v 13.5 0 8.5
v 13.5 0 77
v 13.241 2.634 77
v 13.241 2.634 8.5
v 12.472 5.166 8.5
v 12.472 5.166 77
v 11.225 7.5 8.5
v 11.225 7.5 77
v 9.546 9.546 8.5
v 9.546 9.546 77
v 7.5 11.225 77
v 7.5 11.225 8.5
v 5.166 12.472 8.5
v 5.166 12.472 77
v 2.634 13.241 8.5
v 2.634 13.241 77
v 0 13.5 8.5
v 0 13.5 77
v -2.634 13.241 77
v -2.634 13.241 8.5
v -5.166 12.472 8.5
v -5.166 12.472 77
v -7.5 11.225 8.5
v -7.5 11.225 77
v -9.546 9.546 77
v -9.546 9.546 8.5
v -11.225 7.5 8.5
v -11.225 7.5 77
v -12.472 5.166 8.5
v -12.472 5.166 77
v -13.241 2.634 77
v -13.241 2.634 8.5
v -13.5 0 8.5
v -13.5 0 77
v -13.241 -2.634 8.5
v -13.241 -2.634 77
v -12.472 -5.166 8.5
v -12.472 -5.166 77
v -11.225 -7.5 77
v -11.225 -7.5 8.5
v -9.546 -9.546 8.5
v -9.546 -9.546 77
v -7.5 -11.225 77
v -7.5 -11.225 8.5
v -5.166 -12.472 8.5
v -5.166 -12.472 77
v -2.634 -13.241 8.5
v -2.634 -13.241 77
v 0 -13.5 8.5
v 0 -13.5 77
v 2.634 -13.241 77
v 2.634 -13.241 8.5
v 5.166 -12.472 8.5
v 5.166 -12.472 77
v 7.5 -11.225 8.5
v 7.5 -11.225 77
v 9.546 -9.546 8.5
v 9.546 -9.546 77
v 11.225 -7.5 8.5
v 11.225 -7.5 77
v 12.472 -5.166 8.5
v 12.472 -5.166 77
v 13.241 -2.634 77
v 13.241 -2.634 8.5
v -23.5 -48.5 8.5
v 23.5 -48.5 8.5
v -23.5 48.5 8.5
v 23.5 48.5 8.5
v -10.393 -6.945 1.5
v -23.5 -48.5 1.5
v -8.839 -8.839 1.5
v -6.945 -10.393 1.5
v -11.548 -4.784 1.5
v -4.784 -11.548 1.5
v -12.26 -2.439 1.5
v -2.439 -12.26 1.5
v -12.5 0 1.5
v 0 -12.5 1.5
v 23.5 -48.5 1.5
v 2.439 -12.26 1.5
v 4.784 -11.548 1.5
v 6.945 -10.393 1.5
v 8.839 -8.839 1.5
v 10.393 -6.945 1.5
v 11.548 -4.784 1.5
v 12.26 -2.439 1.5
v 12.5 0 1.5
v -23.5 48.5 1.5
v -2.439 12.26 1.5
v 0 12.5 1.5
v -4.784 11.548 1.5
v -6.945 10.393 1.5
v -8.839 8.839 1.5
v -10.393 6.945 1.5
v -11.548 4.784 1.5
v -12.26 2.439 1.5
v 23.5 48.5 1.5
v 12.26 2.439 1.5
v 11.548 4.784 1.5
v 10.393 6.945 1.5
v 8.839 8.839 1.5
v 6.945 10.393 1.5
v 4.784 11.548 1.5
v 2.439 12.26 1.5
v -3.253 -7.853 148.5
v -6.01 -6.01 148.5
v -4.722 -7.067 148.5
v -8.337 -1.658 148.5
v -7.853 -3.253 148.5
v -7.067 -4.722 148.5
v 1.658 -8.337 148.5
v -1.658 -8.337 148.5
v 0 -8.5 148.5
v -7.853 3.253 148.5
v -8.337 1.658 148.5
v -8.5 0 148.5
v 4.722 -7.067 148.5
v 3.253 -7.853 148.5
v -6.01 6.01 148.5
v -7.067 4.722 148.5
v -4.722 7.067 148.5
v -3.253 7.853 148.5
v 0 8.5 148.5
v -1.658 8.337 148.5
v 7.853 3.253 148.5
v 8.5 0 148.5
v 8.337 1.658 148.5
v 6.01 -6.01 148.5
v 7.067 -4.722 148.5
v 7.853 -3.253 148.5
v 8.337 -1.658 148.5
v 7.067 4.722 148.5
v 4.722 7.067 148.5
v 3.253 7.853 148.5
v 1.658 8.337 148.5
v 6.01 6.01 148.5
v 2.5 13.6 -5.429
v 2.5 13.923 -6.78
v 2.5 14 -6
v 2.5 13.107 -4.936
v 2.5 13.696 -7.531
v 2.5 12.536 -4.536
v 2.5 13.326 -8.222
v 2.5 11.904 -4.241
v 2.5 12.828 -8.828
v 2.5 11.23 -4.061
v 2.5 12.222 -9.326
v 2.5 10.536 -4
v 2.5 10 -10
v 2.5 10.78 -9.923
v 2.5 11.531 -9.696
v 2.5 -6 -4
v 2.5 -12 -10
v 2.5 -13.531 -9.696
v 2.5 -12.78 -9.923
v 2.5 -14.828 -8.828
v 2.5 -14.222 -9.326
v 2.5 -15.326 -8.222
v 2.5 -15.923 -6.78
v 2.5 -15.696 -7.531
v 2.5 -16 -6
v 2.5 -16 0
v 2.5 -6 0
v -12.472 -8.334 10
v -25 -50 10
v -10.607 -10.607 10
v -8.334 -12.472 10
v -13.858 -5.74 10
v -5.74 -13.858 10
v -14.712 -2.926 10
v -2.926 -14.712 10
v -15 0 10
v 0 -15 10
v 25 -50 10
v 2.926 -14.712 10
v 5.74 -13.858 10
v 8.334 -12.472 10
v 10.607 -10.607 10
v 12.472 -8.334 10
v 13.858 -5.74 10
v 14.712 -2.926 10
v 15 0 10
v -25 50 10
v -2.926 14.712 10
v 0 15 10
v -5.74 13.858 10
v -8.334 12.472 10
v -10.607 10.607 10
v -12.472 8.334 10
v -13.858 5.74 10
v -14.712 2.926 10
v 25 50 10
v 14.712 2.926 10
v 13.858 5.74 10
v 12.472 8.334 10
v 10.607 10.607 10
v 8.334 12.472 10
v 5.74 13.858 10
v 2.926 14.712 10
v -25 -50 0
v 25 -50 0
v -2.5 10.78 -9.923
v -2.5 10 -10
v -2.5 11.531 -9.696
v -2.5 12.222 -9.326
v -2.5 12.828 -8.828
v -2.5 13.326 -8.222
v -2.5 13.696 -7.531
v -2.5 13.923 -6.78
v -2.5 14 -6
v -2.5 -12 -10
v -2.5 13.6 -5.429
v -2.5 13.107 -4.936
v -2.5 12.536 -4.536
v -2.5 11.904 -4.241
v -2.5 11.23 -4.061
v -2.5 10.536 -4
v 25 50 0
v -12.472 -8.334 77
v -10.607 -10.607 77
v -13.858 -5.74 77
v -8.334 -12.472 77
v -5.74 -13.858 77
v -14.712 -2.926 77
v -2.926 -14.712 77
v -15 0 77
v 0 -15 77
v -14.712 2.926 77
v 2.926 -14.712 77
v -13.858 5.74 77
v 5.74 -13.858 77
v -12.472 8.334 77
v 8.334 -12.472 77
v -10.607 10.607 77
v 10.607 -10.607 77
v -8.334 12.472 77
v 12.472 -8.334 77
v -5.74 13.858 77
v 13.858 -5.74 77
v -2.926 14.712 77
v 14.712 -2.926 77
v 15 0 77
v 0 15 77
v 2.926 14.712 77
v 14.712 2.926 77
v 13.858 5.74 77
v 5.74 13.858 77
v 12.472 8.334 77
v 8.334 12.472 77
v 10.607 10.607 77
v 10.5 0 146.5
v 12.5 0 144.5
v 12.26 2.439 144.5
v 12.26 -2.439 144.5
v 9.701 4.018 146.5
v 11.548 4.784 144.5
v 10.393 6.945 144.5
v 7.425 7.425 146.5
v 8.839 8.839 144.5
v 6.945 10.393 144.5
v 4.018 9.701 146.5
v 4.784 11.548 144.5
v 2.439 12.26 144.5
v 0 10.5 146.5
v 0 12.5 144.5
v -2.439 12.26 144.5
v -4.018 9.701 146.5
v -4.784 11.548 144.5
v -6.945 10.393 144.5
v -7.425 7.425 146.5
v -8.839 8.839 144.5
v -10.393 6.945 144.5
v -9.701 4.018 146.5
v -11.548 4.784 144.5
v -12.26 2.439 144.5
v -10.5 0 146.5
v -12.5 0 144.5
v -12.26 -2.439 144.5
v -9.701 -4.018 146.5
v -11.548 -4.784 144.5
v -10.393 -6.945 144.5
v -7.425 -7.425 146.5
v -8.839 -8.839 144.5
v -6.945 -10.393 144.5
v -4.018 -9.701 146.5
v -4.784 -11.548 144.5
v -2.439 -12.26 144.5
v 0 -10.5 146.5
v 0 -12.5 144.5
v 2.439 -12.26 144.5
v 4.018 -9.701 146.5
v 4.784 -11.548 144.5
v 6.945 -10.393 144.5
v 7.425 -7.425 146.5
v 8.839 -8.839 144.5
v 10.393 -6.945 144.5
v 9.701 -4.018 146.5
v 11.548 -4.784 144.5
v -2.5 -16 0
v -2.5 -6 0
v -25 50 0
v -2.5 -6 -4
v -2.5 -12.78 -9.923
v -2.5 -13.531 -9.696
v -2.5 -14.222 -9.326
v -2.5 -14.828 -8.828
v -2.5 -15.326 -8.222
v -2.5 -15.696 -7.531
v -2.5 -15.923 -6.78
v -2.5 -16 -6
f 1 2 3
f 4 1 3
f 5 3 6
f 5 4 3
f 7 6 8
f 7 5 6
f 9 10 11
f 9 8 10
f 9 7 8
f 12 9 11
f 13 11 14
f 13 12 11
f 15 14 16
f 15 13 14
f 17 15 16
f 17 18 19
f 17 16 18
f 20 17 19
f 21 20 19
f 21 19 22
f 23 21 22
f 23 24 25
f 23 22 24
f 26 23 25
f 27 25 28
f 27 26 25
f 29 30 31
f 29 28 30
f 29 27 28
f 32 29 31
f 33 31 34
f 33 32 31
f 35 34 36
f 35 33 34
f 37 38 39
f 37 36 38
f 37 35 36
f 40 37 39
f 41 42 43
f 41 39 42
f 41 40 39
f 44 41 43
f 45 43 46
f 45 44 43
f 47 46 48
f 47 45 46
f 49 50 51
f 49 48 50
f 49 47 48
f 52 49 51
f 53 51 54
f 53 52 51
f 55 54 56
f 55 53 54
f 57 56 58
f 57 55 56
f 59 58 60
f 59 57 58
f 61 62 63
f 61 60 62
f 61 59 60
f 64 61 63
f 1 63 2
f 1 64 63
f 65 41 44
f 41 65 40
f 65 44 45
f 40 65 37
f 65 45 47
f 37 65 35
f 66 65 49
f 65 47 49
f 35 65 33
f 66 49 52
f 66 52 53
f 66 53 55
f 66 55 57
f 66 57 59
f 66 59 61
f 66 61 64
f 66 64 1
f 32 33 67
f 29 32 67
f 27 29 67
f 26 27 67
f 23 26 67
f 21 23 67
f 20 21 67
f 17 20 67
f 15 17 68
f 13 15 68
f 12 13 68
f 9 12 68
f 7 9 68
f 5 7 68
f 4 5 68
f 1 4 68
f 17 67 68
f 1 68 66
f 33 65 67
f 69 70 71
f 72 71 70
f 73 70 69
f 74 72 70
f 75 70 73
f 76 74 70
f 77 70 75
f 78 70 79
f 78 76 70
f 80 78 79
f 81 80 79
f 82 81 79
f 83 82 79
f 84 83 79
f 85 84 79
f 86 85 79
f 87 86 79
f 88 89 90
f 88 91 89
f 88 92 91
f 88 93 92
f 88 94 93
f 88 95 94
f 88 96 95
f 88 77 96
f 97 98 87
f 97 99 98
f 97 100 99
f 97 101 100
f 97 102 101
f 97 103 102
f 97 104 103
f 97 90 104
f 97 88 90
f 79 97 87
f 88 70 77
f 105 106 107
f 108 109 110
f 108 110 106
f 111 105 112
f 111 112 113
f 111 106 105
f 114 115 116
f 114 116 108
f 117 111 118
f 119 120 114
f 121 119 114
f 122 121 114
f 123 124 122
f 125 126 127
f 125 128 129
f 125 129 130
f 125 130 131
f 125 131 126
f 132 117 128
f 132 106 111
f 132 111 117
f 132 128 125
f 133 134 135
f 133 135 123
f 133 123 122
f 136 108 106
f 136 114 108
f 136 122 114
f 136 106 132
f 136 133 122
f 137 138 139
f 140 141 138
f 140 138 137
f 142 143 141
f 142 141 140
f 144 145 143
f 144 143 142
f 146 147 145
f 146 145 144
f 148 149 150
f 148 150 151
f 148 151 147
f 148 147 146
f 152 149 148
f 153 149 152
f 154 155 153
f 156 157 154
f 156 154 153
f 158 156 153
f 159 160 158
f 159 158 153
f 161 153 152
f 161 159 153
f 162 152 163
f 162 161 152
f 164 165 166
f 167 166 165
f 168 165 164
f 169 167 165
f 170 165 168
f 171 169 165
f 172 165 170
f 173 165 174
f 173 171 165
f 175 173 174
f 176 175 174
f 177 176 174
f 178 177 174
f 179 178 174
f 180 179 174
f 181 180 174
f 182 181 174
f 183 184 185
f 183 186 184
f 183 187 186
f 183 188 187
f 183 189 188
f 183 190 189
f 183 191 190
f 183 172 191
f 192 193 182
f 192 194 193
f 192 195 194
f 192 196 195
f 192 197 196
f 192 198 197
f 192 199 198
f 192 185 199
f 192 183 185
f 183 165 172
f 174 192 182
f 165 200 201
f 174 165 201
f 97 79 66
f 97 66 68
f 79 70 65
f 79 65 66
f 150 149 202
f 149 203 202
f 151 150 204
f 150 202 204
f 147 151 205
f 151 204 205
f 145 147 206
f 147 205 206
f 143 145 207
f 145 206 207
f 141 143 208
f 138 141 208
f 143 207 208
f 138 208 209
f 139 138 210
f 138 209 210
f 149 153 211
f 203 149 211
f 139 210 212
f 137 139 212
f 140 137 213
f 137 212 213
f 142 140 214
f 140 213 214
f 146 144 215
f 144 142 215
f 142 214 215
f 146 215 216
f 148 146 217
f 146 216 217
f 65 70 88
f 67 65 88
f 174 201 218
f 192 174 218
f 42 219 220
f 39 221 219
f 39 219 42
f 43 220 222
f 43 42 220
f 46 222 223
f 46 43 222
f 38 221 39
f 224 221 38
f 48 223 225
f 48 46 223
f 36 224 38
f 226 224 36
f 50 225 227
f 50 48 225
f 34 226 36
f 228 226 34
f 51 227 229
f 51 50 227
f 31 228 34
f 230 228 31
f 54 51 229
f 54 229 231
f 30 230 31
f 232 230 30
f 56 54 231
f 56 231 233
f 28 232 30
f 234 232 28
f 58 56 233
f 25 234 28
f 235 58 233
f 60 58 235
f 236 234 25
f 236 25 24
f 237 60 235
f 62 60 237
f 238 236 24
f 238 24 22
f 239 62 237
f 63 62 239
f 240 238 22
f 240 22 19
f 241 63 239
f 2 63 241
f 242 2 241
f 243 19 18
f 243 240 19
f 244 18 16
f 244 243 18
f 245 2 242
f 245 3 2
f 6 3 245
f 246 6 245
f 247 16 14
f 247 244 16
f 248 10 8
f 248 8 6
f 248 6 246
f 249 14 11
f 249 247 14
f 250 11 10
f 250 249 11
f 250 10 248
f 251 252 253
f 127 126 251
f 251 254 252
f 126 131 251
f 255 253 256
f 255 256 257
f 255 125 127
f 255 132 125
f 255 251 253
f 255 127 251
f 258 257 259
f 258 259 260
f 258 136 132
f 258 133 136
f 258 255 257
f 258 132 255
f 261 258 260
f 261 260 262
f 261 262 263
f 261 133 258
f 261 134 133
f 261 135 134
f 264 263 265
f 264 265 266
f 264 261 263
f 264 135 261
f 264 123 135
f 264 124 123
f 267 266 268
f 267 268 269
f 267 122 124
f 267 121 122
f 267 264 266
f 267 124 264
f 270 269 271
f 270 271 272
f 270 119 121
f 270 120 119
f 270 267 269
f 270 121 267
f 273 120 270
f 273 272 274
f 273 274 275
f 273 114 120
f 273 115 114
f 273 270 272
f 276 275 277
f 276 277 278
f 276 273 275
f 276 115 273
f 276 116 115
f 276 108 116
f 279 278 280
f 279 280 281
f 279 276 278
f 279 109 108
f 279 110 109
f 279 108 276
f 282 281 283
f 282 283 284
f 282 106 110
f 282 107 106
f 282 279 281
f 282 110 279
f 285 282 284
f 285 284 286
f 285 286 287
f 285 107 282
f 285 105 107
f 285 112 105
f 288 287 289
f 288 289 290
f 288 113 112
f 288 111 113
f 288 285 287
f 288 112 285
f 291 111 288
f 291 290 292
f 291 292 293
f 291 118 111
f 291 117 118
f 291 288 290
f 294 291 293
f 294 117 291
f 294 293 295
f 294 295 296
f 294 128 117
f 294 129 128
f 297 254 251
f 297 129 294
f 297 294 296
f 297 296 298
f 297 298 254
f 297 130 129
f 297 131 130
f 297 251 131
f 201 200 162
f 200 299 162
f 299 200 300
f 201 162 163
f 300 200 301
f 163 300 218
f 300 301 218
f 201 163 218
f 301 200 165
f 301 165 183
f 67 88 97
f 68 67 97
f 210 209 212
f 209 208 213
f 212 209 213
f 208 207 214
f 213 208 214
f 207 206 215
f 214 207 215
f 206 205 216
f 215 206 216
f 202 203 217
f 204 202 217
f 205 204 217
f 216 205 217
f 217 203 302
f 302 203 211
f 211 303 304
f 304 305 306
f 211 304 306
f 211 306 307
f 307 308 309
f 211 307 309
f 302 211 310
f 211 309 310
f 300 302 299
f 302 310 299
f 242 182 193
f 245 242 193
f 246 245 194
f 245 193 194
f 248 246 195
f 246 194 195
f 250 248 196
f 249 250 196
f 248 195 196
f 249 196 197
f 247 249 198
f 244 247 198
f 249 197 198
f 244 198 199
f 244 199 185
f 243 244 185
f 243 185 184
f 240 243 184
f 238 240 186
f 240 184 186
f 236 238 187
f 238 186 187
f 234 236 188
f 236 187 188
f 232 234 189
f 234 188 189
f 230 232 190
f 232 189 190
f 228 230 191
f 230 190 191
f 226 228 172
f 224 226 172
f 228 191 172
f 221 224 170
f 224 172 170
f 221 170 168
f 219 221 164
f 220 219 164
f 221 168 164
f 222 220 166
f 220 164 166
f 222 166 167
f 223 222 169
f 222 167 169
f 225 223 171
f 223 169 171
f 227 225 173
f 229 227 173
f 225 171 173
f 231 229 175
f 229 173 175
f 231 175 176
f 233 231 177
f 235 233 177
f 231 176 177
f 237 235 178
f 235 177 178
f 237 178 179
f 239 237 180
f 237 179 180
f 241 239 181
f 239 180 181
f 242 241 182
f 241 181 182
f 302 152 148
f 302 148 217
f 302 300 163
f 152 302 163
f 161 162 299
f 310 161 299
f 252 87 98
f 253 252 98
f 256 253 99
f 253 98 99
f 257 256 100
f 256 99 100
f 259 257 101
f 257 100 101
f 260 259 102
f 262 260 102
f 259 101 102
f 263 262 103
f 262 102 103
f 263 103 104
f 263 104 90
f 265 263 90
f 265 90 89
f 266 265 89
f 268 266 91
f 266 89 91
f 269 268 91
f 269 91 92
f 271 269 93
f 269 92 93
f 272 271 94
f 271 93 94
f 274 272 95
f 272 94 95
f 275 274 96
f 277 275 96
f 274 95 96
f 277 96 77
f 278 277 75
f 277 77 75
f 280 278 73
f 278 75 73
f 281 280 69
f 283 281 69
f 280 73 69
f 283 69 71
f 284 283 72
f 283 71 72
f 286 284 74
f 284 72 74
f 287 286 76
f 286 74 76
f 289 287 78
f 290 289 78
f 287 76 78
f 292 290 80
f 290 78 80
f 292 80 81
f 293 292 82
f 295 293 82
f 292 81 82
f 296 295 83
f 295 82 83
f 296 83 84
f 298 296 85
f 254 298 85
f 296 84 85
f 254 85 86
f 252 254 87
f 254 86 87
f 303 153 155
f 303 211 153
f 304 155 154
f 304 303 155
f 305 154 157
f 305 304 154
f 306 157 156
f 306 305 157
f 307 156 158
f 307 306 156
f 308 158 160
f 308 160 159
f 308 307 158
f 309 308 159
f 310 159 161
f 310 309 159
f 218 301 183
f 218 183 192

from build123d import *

# Parameters (mm, degrees)
F0_W         = 50
F0_H         = 100
F1_DEPTH     = 10
F2_R         = 15
F3_DEPTH     = 67
F4_T         = -1.5
F5_R         = 12.5
F6_DEPTH     = 147
F7_SIZE      = 4
F9_DEPTH     = 10
F10_W        = 5
F10_H        = 6
F11_DEPTH    = 20
F12_R        = 4
F13_R        = 4
F14_T1_DEPTH = 22.3205080757


# Not quite as in the source:
# - a fillet or chamfer that OpenCascade refuses, or shapes differently, is made with other operations: its cross-section is extruded or revolved along the edge and cut away or added


with BuildPart() as f1:
    # F0 (on Top) → F1 (new body)
    with BuildSketch(Plane.XY):
        Rectangle(F0_W, F0_H)
    extrude(amount=F1_DEPTH)

    # F2 (on face) → F3 (join)
    with BuildSketch(Plane.XY.offset(10)):
        Circle(F2_R)
    extrude(amount=F3_DEPTH)

    # F4
    f4_openings = [f1.faces().sort_by_distance(p)[0] for p in [
        (0, 0, 77),
    ]]
    offset(amount=F4_T, openings=f4_openings, kind=Kind.INTERSECTION)

    # F5 (on face) → F6 (join)
    with BuildSketch(Plane.XY.offset(1.5)):
        Circle(F5_R)
    extrude(amount=F6_DEPTH)

    # F7
    f7_edges = [f1.edges().sort_by_distance(p)[0] for p in [
        (-12.5, 0, 148.5),
    ]]
    chamfer(f7_edges, length=F7_SIZE)

    # F8 (on face) → F9 (join)
    with BuildSketch(Plane(origin=(0, 0, 0), x_dir=(1, 0, 0), z_dir=(0, 0, -1))):
        Polygon((2.5, 16), (0, 16), (-2.5, 16), (-2.5, 6), (2.5, 6), align=None)
    extrude(amount=F9_DEPTH)

    # F10 (on face) → F11 (join)
    with BuildSketch(Plane(origin=(0, -6, 0), x_dir=(-1, 0, 0), z_dir=(0, 1, 0))):
        with Locations((0, -7)):
            Rectangle(F10_W, F10_H)
    extrude(amount=F11_DEPTH)

    # F12
    f12_edges = [f1.edges().sort_by_distance(p)[0] for p in [
        (0, 14, -10),
    ]]
    fillet(f12_edges, radius=F12_R)

    # F13
    f13_edges = [f1.edges().sort_by_distance(p)[0] for p in [
        (0, -16, -10),
    ]]
    fillet(f13_edges, radius=F13_R)

    # F14: fillet of radius 4 on 1 edges, made by hand

    # F14_s2 → F14_t1 (cut)
    with BuildSketch(Plane.YZ.offset(-11.1602540378)):
        with BuildLine():
            ThreePointArc((14, -6), (12.5358983849, -4.5358983849), (10.5358983849, -4))
            Line((10.5358983849, -4), (14, -4))
            Line((14, -4), (14, -6))
        make_face()
    extrude(amount=F14_T1_DEPTH, mode=Mode.SUBTRACT)


solid = f1.part
